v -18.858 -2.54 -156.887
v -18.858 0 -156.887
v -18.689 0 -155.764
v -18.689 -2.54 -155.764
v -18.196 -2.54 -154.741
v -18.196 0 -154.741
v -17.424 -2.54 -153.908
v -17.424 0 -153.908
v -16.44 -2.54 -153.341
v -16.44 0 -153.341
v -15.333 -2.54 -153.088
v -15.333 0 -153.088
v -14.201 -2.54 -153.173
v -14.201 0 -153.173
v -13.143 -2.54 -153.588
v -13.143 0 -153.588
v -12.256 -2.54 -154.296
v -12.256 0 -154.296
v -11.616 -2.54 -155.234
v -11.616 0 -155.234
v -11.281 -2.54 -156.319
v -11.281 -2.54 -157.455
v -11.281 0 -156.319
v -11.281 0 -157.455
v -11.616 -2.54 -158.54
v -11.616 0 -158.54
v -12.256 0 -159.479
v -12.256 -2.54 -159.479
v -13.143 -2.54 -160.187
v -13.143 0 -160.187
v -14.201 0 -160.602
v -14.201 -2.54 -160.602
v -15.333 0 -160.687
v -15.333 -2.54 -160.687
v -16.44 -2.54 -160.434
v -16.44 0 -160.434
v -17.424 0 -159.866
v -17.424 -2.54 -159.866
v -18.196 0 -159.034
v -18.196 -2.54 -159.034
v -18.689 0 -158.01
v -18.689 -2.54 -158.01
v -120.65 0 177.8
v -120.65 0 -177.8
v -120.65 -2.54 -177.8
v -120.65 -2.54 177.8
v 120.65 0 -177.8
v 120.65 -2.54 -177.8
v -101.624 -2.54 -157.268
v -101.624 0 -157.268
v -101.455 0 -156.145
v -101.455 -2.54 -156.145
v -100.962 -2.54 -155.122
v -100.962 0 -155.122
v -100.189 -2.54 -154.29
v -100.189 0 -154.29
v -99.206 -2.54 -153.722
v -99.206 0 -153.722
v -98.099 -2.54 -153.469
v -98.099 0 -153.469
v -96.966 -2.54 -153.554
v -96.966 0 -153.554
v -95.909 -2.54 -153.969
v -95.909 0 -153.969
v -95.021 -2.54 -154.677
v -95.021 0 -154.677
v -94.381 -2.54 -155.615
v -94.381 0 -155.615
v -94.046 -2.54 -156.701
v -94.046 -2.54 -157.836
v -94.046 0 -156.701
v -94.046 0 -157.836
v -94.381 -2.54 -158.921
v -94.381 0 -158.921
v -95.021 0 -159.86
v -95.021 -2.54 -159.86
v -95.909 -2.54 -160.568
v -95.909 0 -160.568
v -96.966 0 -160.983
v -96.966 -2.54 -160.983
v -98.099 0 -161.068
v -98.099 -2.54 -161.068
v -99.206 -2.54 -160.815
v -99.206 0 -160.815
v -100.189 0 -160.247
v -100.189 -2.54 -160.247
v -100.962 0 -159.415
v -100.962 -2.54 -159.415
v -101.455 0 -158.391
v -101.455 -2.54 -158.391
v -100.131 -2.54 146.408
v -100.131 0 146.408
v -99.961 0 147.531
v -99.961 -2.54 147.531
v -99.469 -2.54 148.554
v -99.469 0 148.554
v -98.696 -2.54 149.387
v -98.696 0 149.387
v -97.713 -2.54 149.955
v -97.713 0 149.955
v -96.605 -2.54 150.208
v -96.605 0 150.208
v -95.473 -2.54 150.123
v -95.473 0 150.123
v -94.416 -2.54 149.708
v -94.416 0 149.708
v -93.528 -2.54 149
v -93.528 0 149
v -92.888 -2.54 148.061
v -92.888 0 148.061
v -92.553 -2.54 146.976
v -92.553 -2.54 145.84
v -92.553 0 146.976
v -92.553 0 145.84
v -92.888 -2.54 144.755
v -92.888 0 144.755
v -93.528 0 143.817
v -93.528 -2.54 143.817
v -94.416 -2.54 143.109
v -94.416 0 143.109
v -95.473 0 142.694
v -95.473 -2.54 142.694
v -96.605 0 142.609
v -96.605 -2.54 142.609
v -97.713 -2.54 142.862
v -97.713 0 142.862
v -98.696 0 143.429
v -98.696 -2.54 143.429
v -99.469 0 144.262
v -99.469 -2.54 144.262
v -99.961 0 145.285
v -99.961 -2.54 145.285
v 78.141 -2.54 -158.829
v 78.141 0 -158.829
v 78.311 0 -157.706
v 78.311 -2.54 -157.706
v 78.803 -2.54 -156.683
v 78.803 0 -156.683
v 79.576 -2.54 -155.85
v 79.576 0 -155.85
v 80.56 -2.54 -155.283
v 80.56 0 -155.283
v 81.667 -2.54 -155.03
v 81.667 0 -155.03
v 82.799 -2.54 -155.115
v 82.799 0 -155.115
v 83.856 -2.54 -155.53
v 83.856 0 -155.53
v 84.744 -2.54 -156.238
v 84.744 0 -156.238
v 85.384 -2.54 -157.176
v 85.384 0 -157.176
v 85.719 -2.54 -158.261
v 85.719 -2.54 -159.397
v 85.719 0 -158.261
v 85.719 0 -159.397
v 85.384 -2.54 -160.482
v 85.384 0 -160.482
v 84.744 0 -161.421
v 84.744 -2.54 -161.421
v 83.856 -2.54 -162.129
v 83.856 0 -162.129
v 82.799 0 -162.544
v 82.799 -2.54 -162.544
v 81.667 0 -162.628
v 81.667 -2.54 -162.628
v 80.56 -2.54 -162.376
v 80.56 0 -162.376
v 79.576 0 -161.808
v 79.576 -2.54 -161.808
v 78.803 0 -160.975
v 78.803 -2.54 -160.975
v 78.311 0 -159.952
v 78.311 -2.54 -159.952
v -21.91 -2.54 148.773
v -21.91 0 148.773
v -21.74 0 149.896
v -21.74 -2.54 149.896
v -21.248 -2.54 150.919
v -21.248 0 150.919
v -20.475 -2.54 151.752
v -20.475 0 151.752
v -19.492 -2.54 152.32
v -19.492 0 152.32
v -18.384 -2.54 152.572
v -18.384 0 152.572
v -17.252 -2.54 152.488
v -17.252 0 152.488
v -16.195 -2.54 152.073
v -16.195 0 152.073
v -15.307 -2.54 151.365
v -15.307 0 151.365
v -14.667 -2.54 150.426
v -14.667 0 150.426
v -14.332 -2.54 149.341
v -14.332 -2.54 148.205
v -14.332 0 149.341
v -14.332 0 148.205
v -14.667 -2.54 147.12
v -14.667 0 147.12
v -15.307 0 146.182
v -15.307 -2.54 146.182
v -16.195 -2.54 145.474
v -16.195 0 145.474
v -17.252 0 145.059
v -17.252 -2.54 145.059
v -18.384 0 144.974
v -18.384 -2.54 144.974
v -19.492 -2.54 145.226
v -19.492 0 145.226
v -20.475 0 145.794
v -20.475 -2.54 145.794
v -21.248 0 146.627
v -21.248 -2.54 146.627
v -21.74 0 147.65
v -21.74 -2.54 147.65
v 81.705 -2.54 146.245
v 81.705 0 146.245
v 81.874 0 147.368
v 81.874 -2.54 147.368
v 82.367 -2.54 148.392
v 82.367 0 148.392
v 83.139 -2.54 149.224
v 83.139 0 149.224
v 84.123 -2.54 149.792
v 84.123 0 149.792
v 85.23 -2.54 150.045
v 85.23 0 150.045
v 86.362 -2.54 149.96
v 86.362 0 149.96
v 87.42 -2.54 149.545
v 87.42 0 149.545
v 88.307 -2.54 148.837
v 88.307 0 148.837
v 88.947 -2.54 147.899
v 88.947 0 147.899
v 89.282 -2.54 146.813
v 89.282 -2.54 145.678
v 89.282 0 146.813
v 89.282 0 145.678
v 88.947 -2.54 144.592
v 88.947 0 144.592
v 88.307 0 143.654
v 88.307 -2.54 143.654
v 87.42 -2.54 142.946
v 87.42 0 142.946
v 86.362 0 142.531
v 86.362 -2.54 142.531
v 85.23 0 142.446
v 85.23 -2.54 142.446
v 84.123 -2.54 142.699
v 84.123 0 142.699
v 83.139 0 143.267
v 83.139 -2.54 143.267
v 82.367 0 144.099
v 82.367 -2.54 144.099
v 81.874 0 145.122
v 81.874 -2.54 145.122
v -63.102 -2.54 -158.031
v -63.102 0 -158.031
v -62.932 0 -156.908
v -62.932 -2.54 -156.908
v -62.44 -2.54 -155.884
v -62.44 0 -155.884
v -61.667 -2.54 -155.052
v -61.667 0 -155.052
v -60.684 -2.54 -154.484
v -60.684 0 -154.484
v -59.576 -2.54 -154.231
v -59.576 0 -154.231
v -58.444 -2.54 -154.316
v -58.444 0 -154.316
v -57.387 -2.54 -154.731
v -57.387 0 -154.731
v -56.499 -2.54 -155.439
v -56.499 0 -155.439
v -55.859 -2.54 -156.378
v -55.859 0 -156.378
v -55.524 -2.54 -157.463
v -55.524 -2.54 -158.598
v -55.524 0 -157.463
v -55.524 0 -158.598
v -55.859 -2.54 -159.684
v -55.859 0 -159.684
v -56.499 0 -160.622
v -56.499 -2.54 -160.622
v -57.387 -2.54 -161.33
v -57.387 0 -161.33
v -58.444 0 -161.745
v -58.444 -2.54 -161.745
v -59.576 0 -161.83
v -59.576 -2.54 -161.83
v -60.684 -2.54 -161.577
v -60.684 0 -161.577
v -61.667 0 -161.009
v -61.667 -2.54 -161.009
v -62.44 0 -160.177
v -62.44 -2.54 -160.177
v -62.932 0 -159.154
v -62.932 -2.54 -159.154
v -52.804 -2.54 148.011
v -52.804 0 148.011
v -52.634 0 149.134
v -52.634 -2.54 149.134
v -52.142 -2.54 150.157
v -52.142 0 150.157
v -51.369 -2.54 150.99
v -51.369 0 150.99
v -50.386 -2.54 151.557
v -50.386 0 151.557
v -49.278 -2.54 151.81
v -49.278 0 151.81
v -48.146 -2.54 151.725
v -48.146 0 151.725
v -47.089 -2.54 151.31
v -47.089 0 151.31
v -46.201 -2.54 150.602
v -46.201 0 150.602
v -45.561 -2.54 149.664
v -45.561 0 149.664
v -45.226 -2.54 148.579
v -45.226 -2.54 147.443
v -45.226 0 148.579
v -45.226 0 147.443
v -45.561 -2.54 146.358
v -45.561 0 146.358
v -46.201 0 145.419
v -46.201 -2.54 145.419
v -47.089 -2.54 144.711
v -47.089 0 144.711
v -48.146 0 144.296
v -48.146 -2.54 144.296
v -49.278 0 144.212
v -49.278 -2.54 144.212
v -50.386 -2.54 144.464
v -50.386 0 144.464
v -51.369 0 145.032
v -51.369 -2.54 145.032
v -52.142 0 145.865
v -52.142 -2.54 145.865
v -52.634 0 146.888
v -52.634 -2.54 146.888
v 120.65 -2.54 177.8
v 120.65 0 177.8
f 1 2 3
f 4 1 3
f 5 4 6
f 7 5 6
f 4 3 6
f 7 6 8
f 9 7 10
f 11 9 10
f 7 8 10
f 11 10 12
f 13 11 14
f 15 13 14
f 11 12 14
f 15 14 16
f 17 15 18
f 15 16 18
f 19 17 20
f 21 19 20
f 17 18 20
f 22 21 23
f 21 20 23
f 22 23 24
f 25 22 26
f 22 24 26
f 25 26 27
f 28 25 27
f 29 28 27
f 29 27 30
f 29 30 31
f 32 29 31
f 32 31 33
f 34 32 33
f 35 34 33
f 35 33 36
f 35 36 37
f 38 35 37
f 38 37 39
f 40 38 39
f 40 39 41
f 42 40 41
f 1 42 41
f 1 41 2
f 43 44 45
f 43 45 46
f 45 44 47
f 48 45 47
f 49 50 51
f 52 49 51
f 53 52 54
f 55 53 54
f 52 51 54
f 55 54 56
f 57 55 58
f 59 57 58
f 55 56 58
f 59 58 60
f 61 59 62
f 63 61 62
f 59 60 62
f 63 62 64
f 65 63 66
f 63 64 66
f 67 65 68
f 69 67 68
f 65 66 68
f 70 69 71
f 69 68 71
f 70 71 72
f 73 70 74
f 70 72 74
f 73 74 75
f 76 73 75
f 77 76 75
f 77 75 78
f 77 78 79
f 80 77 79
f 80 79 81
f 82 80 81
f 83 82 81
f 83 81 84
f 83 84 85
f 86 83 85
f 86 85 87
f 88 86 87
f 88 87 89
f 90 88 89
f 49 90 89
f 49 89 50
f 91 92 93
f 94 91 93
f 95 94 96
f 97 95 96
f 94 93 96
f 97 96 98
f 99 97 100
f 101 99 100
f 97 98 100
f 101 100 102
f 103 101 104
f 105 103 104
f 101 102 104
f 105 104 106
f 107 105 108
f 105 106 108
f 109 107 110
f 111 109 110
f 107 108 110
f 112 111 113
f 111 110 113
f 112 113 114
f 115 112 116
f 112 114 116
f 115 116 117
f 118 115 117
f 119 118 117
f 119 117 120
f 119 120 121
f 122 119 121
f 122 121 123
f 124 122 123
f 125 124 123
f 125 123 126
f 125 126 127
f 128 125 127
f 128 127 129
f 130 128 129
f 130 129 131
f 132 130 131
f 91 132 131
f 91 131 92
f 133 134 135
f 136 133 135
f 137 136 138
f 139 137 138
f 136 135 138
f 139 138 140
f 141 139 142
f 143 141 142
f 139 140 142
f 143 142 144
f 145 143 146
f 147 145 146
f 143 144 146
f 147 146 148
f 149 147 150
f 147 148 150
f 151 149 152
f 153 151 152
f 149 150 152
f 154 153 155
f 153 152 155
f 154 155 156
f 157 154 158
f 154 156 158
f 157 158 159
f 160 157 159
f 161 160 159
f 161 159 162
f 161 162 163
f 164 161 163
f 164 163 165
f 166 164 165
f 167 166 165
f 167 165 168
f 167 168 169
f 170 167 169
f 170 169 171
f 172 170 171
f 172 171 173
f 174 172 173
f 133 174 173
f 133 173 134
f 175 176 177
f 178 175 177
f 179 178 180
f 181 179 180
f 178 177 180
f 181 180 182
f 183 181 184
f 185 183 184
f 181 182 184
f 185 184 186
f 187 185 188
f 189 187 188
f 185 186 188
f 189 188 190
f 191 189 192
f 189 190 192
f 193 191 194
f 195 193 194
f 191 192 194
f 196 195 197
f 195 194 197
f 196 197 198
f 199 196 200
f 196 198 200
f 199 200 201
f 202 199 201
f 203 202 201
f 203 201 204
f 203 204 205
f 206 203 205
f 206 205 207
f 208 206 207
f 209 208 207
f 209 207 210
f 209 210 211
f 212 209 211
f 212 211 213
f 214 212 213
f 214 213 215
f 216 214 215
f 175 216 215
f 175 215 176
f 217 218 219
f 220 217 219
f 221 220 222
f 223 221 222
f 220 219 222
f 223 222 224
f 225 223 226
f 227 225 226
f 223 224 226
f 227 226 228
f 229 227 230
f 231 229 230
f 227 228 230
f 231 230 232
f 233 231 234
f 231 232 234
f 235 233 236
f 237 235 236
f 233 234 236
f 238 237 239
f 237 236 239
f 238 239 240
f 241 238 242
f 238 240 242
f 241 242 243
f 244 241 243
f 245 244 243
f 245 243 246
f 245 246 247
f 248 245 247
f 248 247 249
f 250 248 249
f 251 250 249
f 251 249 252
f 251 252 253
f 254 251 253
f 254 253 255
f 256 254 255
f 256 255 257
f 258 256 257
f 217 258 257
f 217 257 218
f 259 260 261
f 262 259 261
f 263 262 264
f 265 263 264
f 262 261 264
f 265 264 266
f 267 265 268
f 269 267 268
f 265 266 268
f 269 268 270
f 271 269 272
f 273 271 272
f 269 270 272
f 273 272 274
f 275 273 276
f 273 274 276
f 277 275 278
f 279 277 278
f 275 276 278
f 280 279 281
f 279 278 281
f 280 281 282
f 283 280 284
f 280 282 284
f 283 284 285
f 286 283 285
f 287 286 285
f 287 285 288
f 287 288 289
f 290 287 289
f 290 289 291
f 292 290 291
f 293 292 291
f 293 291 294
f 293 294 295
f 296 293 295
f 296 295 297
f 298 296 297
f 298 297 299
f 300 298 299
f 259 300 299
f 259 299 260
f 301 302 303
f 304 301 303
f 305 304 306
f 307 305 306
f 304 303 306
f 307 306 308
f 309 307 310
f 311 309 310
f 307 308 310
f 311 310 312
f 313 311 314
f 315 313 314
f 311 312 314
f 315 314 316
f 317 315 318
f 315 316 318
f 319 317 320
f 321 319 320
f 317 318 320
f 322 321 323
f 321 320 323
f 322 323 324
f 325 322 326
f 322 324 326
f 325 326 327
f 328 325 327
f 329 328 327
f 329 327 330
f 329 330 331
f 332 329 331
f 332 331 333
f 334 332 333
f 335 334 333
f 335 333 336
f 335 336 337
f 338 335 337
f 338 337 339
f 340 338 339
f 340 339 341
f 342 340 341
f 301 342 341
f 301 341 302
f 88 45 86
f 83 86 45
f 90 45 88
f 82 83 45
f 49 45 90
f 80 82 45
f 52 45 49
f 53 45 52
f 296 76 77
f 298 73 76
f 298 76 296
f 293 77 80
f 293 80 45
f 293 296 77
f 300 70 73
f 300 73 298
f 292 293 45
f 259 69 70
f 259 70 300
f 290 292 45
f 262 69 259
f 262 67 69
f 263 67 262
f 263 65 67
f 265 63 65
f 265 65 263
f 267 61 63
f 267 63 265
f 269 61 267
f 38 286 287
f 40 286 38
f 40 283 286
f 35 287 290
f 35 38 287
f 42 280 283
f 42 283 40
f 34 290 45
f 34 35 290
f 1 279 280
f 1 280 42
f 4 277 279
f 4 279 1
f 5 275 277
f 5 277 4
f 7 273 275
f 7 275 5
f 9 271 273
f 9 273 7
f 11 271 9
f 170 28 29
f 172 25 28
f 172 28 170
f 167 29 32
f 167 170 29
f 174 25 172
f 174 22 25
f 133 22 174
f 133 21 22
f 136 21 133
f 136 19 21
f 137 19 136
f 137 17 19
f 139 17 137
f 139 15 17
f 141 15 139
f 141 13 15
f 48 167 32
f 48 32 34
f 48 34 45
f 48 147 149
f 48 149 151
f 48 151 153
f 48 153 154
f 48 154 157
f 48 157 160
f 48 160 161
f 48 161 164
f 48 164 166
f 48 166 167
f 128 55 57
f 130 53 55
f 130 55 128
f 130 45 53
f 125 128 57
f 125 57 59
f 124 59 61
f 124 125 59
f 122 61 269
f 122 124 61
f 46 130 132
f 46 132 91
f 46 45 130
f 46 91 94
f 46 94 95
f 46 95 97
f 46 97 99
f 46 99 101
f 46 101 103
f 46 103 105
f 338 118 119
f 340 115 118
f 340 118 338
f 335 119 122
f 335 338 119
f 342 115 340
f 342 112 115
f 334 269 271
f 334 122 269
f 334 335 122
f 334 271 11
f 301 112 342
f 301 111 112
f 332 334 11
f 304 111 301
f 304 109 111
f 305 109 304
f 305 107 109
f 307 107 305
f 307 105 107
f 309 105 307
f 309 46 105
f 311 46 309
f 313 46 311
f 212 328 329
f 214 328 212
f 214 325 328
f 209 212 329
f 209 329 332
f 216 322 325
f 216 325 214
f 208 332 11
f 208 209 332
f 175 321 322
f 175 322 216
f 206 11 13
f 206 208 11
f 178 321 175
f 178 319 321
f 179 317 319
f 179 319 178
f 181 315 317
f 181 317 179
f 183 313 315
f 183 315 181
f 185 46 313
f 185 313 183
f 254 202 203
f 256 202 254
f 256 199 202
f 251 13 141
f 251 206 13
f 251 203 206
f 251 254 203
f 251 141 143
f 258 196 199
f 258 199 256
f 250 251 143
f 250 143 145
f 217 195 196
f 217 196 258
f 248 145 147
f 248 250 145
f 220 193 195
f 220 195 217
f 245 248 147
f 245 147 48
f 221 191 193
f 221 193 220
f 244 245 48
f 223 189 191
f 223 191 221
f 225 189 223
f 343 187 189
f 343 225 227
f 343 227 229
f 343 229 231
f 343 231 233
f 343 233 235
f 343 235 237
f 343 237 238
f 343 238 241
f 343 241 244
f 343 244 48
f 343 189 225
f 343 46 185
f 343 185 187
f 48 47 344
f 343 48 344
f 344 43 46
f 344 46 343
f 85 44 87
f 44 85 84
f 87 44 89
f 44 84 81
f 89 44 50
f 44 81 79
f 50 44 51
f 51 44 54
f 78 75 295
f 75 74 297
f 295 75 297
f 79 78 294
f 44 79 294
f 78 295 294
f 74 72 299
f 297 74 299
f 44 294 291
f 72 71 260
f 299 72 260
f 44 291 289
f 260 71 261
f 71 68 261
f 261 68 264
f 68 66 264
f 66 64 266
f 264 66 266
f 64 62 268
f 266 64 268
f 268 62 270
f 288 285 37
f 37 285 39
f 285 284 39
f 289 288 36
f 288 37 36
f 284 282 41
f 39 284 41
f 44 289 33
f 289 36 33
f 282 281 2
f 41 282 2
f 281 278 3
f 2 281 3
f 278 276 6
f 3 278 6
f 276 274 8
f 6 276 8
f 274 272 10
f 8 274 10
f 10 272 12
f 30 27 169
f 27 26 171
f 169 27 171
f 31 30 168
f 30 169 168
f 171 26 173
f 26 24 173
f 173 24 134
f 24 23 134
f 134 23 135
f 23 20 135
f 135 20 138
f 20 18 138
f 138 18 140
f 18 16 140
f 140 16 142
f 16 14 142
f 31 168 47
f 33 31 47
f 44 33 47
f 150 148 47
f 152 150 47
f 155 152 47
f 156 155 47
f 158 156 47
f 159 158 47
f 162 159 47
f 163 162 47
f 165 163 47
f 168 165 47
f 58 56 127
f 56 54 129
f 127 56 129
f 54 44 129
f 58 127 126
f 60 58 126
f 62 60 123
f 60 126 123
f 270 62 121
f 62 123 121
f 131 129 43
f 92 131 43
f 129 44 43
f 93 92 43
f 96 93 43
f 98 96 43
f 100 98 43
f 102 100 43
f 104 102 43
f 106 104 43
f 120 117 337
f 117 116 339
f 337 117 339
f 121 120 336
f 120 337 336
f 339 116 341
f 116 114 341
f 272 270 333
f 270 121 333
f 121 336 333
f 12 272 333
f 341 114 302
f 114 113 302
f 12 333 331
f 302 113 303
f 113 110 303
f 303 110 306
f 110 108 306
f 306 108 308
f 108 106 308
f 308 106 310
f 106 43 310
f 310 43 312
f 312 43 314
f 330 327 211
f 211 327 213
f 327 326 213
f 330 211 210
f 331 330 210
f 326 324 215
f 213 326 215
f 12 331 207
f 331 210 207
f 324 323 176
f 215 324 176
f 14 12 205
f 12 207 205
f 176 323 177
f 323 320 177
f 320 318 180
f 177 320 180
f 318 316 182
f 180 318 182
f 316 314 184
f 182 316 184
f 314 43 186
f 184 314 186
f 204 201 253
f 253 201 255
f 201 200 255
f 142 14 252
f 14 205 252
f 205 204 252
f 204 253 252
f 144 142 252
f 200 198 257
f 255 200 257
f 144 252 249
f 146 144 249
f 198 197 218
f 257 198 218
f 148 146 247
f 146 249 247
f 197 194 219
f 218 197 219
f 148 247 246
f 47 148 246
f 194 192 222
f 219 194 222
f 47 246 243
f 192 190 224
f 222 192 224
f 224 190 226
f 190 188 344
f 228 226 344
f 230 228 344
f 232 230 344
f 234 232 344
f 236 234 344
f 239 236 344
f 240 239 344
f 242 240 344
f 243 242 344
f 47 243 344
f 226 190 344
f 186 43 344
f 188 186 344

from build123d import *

# Parameters (mm, degrees)
F0_W     = 241.3
F0_H     = 355.6
F1_DEPTH = 2.54
F3_D     = 7.62
F5_D     = 7.62
F7_D     = 7.62


with BuildPart() as f1:
    # F0 (on Front) → F1 (new body)
    with BuildSketch(Plane.XZ):
        Rectangle(F0_W, F0_H)
    extrude(amount=F1_DEPTH)

    # F3 (through all)
    with Locations(Plane.XZ.offset(2.54)):
        with Locations((-97.813867, -157.26839), (-59.291728, -158.030644), (-15.048473, -156.887263), (-18.099729, 148.773089), (-48.993725, 148.01085), (-96.320659, 146.408185)):
            Hole(F3_D / 2)

    # F5 (through all)
    with Locations(Plane.XZ.offset(2.54)):
        with Locations((81.951469, -158.829153)):
            Hole(F5_D / 2)

    # F7 (through all)
    with Locations(Plane.XZ.offset(2.54)):
        with Locations((85.514553, 146.245435)):
            Hole(F7_D / 2)


solid = f1.part
